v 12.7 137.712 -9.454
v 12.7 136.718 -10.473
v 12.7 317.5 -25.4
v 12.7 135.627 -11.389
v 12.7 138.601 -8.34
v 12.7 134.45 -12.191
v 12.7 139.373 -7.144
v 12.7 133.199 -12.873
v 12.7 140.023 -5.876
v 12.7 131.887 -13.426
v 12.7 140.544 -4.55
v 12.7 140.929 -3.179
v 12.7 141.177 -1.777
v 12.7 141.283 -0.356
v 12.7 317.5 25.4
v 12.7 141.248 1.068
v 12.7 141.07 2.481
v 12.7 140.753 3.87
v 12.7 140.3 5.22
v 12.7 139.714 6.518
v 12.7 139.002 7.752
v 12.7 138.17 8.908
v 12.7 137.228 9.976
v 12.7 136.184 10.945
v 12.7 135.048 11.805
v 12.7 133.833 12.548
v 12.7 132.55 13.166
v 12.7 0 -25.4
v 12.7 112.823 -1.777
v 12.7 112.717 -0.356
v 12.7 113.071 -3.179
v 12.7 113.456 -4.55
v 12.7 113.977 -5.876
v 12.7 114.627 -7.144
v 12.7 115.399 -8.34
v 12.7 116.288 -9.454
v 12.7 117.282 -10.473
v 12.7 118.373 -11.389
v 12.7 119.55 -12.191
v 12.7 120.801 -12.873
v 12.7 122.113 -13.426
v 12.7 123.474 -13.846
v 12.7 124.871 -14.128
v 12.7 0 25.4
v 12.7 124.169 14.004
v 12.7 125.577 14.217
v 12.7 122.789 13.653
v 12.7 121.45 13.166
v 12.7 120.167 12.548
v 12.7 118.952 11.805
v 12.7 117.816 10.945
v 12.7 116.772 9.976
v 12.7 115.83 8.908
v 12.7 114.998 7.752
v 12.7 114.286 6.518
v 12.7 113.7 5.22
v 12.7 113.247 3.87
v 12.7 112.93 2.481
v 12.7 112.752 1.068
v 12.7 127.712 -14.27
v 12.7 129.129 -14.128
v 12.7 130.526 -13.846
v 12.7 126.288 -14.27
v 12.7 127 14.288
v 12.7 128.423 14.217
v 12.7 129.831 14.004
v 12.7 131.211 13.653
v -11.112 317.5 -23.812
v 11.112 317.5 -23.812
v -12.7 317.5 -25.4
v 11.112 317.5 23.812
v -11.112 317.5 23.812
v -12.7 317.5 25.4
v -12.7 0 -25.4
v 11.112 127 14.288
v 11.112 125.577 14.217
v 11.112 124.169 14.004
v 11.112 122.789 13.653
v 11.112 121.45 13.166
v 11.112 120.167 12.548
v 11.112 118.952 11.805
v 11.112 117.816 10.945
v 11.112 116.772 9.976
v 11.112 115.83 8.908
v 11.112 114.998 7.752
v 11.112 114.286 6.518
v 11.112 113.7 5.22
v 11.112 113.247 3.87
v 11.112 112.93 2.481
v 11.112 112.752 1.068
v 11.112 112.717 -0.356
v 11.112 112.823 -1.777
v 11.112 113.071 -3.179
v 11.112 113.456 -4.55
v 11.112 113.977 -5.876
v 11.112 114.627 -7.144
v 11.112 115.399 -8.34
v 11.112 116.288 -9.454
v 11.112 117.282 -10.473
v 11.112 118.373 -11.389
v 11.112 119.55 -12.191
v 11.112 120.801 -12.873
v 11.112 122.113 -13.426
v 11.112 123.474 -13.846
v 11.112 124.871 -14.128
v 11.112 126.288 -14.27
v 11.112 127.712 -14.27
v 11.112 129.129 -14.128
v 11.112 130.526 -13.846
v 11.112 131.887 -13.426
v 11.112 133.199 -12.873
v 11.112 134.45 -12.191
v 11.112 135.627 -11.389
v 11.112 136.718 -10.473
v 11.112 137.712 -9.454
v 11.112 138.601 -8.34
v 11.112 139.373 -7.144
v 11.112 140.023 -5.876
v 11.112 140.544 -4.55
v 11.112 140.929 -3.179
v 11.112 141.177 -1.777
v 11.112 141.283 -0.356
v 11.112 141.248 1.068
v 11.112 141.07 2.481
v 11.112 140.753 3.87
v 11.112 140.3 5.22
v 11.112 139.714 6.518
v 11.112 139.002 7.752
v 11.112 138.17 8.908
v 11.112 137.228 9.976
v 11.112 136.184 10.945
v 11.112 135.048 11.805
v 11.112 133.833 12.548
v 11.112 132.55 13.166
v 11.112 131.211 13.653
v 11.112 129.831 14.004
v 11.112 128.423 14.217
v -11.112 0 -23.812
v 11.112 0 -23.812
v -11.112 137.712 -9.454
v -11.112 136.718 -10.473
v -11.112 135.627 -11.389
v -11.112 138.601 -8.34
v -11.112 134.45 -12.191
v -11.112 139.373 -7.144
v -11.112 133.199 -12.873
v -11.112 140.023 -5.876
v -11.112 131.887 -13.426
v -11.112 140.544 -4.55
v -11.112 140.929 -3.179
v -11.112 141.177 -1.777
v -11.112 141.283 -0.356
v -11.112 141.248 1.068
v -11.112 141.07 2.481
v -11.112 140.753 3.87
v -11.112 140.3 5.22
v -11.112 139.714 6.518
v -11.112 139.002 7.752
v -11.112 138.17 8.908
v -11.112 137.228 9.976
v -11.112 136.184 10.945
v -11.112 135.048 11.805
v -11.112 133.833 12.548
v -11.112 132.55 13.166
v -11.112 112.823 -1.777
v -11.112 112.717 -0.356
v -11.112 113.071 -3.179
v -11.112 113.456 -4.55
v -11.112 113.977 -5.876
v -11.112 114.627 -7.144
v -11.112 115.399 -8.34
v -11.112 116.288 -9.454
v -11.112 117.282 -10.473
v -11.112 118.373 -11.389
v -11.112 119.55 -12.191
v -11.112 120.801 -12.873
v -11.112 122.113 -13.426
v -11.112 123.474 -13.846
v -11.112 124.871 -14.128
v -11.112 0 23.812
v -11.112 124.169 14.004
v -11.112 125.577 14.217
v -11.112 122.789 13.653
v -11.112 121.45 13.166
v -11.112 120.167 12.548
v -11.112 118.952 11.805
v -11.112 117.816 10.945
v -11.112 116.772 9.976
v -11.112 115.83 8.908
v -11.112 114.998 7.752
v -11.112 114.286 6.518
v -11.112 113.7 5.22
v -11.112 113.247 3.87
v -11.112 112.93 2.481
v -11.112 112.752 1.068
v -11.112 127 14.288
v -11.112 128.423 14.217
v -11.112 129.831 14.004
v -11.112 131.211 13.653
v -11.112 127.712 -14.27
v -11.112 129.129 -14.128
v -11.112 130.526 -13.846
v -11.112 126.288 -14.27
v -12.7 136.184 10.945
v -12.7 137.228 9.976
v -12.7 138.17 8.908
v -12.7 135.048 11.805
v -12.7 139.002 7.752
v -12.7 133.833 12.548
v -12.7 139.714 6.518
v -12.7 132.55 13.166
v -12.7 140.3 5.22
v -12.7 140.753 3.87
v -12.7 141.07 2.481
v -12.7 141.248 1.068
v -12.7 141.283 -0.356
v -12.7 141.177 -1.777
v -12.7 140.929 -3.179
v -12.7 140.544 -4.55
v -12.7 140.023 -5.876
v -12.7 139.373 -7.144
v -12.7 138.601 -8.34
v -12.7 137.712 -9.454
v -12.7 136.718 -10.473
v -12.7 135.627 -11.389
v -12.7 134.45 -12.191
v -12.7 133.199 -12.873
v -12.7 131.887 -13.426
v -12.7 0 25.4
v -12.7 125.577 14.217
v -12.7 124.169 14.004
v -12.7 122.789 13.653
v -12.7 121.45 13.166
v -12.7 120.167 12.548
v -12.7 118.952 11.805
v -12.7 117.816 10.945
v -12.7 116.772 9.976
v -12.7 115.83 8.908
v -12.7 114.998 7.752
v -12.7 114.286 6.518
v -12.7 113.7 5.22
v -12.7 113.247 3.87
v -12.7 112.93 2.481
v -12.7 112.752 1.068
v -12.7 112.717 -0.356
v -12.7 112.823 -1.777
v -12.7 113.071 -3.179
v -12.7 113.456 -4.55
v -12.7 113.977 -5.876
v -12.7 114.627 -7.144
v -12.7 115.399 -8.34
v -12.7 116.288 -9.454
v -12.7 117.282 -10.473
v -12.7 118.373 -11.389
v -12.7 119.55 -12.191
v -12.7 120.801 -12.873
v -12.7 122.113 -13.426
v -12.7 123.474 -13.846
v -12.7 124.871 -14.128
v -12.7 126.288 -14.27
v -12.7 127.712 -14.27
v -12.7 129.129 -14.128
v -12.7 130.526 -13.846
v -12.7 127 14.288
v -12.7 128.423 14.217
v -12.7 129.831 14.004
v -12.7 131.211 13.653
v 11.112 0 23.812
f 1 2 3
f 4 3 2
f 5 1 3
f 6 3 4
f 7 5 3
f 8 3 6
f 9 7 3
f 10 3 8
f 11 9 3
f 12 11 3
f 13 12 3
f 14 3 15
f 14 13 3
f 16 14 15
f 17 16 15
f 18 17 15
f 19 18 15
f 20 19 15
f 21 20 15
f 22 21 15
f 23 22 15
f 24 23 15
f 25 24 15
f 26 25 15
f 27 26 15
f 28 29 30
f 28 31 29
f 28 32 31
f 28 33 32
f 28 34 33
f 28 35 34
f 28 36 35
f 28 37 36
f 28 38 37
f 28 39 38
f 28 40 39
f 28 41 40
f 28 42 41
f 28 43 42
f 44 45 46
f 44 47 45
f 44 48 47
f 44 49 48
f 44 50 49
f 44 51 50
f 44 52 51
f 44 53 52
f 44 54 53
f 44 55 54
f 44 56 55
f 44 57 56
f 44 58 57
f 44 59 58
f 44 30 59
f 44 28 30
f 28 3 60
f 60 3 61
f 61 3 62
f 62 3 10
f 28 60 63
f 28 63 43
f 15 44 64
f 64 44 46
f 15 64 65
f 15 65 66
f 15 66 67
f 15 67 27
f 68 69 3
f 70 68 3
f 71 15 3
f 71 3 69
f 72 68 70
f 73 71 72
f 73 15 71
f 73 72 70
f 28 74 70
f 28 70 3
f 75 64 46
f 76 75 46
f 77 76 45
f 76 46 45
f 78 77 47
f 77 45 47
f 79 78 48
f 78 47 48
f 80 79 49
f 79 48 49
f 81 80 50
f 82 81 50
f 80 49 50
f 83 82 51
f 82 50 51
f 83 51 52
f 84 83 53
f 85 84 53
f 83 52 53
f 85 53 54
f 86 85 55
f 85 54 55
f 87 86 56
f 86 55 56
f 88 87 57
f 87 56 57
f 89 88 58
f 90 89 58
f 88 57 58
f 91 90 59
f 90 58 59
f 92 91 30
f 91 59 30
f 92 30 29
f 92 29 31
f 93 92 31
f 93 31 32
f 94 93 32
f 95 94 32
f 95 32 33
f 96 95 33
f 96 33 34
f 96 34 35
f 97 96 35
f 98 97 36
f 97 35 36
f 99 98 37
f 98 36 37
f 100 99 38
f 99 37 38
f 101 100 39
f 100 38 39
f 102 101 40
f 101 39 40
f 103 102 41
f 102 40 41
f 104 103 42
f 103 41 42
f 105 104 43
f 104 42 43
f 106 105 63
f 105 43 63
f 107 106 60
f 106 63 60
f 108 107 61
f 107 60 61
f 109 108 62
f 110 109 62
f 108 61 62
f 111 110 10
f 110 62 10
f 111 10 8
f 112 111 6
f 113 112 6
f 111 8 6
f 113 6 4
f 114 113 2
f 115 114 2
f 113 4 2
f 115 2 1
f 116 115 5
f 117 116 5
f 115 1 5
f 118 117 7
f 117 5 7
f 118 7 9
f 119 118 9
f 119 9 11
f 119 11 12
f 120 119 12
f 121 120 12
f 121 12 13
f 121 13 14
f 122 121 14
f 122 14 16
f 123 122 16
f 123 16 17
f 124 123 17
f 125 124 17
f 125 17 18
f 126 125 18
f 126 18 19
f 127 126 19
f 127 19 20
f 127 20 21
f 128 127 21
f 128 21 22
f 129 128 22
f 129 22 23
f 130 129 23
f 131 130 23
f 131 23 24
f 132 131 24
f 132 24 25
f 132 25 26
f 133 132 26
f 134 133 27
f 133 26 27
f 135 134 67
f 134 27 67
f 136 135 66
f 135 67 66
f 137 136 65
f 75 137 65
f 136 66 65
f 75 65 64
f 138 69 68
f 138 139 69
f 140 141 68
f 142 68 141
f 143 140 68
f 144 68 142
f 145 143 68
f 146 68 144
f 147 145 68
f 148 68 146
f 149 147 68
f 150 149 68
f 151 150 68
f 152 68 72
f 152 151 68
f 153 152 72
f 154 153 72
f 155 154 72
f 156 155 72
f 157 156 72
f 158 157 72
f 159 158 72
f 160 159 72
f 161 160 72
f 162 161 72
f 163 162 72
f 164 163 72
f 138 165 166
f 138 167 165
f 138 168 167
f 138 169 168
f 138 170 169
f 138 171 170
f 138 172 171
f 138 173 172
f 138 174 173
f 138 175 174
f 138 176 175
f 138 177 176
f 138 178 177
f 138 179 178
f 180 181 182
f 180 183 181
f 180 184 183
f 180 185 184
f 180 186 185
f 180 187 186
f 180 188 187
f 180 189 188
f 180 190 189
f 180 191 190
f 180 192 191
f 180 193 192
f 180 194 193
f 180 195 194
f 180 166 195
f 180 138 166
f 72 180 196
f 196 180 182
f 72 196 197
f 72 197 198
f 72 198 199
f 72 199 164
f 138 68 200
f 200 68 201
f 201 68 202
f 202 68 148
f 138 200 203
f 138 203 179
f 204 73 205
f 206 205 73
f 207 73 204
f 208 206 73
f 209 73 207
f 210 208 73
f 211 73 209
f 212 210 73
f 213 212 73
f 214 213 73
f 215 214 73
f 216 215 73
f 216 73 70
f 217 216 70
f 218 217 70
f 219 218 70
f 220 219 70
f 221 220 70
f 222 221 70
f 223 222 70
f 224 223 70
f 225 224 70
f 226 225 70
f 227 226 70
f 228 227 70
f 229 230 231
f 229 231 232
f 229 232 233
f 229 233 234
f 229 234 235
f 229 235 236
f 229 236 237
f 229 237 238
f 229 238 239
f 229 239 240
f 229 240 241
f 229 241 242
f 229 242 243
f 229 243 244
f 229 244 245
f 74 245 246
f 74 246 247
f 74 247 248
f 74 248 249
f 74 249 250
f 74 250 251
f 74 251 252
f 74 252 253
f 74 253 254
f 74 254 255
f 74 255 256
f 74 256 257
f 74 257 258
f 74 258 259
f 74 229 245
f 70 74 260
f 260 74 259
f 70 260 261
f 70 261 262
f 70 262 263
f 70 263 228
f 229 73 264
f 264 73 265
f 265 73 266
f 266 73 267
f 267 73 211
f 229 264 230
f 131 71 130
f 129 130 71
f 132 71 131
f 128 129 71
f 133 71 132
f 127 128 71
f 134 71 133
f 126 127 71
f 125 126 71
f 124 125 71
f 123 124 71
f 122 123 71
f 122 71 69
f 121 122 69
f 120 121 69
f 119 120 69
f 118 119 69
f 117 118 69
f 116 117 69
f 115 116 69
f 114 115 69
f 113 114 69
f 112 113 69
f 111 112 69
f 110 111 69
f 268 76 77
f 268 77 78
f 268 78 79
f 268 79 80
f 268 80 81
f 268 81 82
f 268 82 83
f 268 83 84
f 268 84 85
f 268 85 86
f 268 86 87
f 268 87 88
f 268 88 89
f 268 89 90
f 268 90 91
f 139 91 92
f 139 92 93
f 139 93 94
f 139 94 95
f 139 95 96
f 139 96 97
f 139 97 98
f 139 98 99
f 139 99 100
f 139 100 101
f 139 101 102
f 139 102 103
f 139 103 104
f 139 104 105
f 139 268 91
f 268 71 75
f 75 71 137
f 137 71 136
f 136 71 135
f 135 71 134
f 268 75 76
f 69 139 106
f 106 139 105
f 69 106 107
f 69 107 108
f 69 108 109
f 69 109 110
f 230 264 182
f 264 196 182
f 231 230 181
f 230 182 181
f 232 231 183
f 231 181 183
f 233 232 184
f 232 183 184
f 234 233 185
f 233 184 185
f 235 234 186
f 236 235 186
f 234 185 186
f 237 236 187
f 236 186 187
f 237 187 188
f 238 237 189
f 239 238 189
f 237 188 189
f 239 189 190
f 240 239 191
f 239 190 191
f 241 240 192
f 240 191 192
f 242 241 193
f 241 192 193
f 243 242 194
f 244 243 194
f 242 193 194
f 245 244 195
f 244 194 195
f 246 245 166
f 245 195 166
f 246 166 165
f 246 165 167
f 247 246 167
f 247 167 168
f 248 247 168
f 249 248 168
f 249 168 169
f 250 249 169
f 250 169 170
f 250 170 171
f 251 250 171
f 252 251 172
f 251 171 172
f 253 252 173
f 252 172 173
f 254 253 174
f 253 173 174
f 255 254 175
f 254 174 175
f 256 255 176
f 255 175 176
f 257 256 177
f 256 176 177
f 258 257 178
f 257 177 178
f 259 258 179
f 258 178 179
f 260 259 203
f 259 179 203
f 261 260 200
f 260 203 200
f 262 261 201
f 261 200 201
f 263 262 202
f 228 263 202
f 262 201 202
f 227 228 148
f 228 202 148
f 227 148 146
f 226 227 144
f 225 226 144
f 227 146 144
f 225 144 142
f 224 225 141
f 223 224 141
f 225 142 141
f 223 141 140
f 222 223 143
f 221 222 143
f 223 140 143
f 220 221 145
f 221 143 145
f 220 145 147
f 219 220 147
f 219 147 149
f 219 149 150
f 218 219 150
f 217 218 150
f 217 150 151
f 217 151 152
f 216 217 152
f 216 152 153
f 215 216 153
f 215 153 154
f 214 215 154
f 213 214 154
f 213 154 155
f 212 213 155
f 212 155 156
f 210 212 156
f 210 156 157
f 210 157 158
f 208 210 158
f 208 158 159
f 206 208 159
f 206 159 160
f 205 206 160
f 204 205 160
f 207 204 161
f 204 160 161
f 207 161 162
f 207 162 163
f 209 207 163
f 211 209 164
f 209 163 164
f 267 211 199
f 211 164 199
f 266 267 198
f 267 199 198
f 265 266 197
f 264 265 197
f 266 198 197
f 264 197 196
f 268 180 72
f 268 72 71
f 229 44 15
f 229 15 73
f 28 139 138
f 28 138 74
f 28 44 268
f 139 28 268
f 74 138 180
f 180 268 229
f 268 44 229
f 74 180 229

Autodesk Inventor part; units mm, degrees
ref_plane "YZ Plane" through (0, 0, 0) normal (1, 0, 0) x (0, 1, 0)
ref_plane "XZ Plane" through (0, 0, 0) normal (0, 1, 0) x (-1, 0, 0)
ref_plane "XY Plane" through (0, 0, 0) normal (0, 0, 1) x (1, 0, 0)
sketch "Sketch1" plane through (0, 0, 0) normal (0, 1, 0) x (-1, 0, 0)
  line L0 (-12.7, 25.4) -> (12.7, 25.4)
  line L1 (12.7, 25.4) -> (12.7, -25.4)
  line L2 (12.7, -25.4) -> (-12.7, -25.4)
  line L3 (-12.7, -25.4) -> (-12.7, 25.4)
  line L4 (-12.7, 25.4) -> (12.7, -25.4) construction
  line L5 (12.7, 25.4) -> (-12.7, -25.4) construction
  line L6 (11.1125, 23.8125) -> (-11.1125, 23.8125)
  line L7 (-11.1125, 23.8125) -> (-11.1125, -23.8125)
  line L8 (-11.1125, -23.8125) -> (11.1125, -23.8125)
  line L9 (11.1125, -23.8125) -> (11.1125, 23.8125)
  line L10 (11.1125, 23.8125) -> (-11.1125, -23.8125) construction
  line L11 (-11.1125, 23.8125) -> (11.1125, -23.8125) construction
  point P0 (0, 0)
  dimension "d0" = 25.4
  dimension "d1" = 50.8
  dimension "d2" = 22.225
  dimension "d3" = 47.625
extrude "Extrusion1" add sketch "Sketch1" along normal blind 317.5
sketch "Sketch2" plane through (-12.7, 0, -25.4) normal (-1, 0, 0) x (0, 0, 1)
  line L0 (50.8, 0) -> (50.8, 317.5) projected
  line L1 (0, 0) -> (50.8, 0) projected
  point P0 (25.4, 0)
  point P1 (25.4, 127)
  dimension "d13" = 25.4
  dimension "d14" = 127
hole "Hole1" at (-12.7, 127, 0) direction (1, 0, 0) diameter 28.575 end through all
properties part number "1x2 Frame" material "Aluminum 6061"
